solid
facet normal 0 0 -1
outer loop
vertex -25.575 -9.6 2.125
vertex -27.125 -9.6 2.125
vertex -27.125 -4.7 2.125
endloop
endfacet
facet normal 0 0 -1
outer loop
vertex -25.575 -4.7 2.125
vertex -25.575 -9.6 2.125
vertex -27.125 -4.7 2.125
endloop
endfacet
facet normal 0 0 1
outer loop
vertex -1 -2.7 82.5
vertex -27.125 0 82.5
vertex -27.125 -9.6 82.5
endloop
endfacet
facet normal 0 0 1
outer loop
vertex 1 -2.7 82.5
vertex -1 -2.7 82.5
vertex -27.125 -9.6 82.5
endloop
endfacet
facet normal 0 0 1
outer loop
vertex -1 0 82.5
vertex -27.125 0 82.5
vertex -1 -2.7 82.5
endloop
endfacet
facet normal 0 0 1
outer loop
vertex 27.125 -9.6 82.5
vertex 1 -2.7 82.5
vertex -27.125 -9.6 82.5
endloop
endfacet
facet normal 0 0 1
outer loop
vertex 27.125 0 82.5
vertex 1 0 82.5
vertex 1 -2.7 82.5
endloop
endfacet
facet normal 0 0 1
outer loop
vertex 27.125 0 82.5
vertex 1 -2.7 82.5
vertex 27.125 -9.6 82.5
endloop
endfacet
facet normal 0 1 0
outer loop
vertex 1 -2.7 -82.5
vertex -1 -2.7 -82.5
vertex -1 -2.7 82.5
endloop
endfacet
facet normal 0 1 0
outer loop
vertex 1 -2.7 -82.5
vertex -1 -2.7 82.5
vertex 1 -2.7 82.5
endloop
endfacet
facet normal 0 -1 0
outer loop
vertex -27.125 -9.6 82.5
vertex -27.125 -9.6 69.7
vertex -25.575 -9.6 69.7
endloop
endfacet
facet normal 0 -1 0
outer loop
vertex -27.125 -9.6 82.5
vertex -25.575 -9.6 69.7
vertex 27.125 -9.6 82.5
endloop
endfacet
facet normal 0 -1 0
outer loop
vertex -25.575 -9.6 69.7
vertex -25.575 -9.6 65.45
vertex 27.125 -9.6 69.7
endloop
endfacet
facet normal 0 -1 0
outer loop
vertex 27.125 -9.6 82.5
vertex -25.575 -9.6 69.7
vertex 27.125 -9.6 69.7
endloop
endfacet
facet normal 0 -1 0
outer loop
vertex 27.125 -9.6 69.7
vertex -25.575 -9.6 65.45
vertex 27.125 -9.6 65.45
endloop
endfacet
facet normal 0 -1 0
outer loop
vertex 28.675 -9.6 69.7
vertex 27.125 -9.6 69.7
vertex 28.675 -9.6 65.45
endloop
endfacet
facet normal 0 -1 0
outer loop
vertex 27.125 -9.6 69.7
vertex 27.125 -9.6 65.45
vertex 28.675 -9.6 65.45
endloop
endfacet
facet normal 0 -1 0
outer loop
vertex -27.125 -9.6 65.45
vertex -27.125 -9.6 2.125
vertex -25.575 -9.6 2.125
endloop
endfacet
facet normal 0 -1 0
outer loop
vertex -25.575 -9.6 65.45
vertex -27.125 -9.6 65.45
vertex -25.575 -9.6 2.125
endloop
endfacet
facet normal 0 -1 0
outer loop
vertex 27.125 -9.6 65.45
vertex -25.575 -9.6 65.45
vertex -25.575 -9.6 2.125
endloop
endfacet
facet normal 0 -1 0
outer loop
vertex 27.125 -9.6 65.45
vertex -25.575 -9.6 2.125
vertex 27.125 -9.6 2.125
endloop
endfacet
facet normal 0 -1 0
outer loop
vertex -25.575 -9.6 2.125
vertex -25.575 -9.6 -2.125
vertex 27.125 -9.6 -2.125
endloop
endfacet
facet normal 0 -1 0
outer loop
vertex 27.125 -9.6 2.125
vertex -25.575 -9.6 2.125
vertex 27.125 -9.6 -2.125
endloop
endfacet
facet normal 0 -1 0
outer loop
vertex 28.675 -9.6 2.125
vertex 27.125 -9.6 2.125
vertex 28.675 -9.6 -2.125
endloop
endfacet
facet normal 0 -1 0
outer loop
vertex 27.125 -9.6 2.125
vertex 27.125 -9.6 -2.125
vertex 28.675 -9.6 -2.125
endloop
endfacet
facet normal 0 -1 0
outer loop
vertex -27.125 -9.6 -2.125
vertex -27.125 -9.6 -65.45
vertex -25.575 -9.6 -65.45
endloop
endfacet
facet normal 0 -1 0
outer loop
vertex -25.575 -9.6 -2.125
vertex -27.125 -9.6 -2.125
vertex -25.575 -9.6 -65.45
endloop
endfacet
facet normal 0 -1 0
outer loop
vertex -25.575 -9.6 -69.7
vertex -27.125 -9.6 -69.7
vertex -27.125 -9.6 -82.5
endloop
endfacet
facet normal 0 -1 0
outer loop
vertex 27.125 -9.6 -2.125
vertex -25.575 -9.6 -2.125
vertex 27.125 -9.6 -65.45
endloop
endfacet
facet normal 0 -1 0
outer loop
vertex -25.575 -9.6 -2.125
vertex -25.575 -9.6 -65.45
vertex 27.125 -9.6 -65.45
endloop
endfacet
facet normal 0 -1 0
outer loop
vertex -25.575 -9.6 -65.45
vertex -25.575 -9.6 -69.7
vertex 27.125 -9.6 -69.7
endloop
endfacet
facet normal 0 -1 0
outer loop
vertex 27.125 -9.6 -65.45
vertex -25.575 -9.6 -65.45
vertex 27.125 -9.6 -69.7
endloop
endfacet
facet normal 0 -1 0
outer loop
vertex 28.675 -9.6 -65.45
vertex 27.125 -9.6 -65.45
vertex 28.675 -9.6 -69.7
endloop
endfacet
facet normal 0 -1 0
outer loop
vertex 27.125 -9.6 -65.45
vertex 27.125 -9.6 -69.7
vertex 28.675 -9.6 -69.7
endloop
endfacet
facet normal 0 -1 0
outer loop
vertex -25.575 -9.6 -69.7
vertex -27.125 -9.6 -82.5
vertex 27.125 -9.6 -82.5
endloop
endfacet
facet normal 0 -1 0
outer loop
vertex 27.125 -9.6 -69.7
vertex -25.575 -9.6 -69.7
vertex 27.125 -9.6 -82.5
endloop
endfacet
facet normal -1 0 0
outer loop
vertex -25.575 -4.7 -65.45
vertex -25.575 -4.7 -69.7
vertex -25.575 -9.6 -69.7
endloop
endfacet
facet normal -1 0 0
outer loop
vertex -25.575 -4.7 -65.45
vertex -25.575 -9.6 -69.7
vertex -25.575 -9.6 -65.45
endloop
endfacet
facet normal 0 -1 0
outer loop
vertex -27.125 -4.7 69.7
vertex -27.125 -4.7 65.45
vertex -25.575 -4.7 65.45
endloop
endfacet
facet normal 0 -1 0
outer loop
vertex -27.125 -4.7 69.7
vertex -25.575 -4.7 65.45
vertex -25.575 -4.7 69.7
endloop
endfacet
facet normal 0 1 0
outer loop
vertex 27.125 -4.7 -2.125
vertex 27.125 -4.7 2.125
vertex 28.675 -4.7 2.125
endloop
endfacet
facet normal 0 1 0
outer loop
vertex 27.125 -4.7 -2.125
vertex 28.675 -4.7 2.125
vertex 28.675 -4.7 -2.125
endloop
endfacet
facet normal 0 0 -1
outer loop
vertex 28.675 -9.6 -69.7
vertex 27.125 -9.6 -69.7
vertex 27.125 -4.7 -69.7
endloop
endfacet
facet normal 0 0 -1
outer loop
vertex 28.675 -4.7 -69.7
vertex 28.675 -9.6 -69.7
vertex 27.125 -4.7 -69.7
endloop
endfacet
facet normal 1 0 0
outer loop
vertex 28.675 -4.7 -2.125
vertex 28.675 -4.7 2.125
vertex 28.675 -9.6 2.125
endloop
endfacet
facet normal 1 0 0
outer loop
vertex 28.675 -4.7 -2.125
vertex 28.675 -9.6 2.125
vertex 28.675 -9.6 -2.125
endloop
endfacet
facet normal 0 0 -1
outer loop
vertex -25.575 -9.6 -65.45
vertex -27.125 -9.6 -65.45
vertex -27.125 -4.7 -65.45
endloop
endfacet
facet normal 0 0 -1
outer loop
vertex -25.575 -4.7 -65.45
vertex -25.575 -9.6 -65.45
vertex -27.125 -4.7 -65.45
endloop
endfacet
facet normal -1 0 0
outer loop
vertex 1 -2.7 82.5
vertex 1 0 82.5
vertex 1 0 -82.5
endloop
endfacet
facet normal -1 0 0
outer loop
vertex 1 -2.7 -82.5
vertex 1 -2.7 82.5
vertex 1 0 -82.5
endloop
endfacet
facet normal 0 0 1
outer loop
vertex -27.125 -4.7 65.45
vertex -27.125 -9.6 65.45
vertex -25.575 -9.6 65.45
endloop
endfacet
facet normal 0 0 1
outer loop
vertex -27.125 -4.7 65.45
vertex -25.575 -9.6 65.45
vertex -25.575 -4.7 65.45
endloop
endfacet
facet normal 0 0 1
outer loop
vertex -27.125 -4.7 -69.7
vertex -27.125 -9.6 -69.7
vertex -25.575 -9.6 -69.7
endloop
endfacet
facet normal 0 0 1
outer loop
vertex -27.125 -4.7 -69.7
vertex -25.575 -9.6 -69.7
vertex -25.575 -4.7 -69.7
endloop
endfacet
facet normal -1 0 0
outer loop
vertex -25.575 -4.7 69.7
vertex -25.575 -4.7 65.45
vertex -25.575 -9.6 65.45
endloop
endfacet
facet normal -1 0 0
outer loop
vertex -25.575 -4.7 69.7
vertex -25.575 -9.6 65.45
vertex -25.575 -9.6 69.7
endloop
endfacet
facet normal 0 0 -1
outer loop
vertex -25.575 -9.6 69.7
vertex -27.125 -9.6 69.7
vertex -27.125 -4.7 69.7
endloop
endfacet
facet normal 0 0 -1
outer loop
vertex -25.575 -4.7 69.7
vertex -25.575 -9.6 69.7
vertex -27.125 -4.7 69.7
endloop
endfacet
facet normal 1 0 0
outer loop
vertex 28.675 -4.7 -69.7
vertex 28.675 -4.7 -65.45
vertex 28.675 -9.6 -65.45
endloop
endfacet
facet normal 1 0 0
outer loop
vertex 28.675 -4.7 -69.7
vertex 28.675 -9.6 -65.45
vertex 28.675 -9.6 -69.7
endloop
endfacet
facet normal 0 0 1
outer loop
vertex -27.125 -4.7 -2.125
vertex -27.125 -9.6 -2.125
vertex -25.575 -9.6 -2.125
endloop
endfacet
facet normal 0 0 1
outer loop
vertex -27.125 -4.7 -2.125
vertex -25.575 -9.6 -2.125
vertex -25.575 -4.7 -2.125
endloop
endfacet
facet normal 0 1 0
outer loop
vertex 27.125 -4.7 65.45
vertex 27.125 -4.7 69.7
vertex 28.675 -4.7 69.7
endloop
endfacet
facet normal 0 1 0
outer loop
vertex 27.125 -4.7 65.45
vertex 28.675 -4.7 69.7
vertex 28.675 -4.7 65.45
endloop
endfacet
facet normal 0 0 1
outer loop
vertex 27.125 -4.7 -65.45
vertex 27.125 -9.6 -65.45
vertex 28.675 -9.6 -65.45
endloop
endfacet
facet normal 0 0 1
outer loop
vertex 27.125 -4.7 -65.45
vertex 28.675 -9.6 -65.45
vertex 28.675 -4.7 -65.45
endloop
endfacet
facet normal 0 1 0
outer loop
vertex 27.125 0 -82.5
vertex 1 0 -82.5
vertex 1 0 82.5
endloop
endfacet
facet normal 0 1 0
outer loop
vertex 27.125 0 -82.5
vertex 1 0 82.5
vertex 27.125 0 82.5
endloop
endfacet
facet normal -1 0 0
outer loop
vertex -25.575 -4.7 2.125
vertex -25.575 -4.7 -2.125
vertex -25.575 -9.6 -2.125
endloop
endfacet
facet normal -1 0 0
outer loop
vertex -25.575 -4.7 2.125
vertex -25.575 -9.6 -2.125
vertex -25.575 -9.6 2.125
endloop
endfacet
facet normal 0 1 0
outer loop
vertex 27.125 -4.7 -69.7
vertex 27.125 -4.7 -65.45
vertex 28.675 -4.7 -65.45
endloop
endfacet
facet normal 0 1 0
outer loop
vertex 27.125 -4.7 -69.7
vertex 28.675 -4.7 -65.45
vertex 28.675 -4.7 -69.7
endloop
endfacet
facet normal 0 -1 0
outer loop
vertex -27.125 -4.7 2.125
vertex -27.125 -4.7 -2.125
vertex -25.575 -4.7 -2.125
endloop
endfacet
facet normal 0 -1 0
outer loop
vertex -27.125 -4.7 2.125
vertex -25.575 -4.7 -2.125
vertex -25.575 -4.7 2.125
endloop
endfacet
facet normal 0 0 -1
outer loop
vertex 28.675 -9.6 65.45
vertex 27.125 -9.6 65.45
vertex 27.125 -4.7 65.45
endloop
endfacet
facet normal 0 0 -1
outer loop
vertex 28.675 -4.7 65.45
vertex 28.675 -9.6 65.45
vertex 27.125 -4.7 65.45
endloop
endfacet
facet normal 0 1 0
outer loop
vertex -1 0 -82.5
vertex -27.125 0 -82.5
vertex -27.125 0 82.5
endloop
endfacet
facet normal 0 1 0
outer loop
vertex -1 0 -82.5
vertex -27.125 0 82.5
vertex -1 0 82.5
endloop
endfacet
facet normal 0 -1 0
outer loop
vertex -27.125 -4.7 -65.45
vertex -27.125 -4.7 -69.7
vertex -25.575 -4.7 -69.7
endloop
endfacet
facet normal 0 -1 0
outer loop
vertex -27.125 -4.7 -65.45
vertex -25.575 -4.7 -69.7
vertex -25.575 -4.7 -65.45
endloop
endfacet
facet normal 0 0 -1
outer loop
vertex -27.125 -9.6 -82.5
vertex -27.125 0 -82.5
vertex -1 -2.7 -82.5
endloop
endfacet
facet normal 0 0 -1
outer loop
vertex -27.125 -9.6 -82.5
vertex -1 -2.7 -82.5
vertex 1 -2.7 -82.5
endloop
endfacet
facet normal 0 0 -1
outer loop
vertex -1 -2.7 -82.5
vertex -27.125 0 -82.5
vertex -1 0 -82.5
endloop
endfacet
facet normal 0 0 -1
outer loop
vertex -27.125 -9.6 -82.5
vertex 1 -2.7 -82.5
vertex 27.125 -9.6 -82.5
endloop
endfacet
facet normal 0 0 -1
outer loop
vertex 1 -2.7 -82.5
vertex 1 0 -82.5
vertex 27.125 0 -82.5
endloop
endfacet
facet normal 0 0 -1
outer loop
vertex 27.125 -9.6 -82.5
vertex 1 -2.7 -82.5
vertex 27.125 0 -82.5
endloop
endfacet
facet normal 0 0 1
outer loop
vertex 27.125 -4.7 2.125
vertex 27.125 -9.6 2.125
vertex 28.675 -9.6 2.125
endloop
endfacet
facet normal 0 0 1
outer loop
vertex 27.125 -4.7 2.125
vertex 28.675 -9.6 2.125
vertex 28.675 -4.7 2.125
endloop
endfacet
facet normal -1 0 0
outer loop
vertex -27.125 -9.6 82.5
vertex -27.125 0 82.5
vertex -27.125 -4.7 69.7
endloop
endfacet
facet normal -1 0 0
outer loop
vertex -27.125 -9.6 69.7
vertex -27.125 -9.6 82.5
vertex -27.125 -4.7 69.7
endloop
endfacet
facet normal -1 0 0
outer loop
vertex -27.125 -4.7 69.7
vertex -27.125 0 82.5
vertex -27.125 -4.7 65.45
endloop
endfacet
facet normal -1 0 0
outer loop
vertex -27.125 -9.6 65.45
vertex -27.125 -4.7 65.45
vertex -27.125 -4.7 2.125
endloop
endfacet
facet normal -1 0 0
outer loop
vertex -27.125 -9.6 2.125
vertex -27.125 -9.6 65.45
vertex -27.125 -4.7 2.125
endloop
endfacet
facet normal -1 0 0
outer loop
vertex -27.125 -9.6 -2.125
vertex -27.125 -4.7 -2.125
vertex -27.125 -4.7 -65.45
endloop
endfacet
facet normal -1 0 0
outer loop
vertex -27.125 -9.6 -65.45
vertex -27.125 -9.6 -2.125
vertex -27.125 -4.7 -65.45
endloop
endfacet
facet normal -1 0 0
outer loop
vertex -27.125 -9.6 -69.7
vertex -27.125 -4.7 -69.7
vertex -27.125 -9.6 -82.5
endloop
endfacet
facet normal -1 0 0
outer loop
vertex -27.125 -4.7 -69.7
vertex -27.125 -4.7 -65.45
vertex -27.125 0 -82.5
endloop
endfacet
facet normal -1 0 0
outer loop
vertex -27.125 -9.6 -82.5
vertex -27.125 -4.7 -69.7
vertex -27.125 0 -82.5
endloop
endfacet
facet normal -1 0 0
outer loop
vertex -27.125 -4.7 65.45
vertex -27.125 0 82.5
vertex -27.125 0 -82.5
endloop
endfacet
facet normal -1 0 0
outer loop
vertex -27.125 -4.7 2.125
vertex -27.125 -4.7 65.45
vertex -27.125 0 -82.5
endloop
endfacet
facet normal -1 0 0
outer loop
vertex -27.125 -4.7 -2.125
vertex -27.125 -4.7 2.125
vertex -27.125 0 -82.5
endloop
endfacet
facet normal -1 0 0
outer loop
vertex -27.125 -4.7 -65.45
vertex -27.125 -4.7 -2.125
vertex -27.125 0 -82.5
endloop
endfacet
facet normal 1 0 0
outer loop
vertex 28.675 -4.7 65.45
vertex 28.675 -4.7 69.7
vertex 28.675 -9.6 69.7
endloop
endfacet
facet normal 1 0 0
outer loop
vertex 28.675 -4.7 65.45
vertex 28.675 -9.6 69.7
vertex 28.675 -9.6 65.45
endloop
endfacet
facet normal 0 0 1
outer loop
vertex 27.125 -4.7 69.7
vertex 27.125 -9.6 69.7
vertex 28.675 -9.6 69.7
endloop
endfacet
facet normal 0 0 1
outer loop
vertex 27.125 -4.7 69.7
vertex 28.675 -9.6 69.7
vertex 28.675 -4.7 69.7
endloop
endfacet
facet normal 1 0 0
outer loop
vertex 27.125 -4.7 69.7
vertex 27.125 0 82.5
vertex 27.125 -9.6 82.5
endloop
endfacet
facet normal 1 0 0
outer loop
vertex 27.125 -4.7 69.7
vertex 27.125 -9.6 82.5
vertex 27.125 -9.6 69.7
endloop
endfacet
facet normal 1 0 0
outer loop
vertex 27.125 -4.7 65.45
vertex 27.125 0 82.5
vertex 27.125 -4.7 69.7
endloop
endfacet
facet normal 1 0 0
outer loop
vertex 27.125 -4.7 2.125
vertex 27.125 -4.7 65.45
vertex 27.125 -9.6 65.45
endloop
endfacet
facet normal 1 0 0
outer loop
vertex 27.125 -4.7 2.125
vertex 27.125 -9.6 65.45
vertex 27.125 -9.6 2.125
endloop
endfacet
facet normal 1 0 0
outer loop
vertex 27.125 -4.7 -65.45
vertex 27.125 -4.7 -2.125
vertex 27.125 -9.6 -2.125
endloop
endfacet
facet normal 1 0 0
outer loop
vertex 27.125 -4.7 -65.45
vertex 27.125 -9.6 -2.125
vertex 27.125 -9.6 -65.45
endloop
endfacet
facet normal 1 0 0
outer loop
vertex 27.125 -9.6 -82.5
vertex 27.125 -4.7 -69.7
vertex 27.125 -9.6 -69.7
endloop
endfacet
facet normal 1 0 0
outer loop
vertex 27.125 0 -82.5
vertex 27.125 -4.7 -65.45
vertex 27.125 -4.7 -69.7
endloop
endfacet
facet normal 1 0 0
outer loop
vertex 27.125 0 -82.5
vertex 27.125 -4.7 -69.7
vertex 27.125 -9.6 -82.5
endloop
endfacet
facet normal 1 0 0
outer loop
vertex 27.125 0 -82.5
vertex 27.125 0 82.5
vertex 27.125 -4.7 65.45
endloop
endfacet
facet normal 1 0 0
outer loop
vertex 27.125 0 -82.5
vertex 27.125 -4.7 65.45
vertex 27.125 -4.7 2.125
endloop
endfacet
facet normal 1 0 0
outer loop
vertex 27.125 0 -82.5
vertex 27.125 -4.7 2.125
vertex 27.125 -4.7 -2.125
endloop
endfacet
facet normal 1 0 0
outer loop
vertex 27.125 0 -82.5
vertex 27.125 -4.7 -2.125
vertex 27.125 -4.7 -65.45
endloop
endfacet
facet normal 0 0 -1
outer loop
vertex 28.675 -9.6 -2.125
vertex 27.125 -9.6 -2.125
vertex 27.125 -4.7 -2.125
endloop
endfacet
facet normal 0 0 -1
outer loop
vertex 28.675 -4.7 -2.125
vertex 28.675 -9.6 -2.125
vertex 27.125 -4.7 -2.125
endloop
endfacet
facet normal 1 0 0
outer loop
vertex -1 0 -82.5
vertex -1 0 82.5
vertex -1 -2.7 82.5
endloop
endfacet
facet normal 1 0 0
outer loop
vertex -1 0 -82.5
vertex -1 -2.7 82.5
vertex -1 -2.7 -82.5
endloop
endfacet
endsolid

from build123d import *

# Parameters (mm, degrees)
SKETCH1_W                = 54.25
SKETCH1_H                = 165
BOSS_EXTRUDE1_DEPTH      = 9.6
BOSS_EXTRUDE2_DEPTH      = 1.55
BOSS_EXTRUDE2_DEPTH_BACK = 1.55
SKETCH2_W                = 4.25
SKETCH2_H                = 4.9
SKETCH15_W               = 4.25
SKETCH15_H               = 4.9
CUT_EXTRUDE1_DEPTH       = 1.55
SKETCH17_W               = 2
SKETCH17_H               = 165
CUT_EXTRUDE2_DEPTH       = 2.7


with BuildPart() as part:
    # Sketch1 → Boss-Extrude1 (new body)
    with BuildSketch(Plane(origin=(0, 0, 0), x_dir=(1, 0, 0), z_dir=(0, 1, 0))):
        Rectangle(SKETCH1_W, SKETCH1_H)
    extrude(amount=-BOSS_EXTRUDE1_DEPTH)

    # Sketch2 → Boss-Extrude2 (add, two sides: drawn at the far end of the back side and taken through both)
    with BuildSketch(Plane(origin=(27.125, 0, 0), x_dir=(0, 0, -1), z_dir=(1, 0, 0)).offset(-BOSS_EXTRUDE2_DEPTH_BACK)):
        with Locations((-67.575, -7.15)):
            Rectangle(SKETCH2_W, SKETCH2_H)
        with Locations((67.575, -7.15)):
            Rectangle(SKETCH2_W, SKETCH2_H)
        with Locations((0, -7.15)):
            Rectangle(SKETCH2_W, SKETCH2_H)
    extrude(amount=BOSS_EXTRUDE2_DEPTH + BOSS_EXTRUDE2_DEPTH_BACK)

    # Sketch15 → Cut-Extrude1 (cut)
    with BuildSketch(Plane.ZY.offset(27.125)):
        with Locations((67.575, -7.15)):
            Rectangle(SKETCH15_W, SKETCH15_H)
        with Locations((-67.575, -7.15)):
            Rectangle(SKETCH15_W, SKETCH15_H)
        with Locations((0, -7.15)):
            Rectangle(SKETCH15_W, SKETCH15_H)
    extrude(amount=-CUT_EXTRUDE1_DEPTH, mode=Mode.SUBTRACT)

    # Sketch17 → Cut-Extrude2 (cut)
    with BuildSketch(Plane(origin=(0, 0, 0), x_dir=(1, 0, 0), z_dir=(0, 1, 0))):
        Rectangle(SKETCH17_W, SKETCH17_H)
    extrude(amount=-CUT_EXTRUDE2_DEPTH, mode=Mode.SUBTRACT)


solid = part.part
